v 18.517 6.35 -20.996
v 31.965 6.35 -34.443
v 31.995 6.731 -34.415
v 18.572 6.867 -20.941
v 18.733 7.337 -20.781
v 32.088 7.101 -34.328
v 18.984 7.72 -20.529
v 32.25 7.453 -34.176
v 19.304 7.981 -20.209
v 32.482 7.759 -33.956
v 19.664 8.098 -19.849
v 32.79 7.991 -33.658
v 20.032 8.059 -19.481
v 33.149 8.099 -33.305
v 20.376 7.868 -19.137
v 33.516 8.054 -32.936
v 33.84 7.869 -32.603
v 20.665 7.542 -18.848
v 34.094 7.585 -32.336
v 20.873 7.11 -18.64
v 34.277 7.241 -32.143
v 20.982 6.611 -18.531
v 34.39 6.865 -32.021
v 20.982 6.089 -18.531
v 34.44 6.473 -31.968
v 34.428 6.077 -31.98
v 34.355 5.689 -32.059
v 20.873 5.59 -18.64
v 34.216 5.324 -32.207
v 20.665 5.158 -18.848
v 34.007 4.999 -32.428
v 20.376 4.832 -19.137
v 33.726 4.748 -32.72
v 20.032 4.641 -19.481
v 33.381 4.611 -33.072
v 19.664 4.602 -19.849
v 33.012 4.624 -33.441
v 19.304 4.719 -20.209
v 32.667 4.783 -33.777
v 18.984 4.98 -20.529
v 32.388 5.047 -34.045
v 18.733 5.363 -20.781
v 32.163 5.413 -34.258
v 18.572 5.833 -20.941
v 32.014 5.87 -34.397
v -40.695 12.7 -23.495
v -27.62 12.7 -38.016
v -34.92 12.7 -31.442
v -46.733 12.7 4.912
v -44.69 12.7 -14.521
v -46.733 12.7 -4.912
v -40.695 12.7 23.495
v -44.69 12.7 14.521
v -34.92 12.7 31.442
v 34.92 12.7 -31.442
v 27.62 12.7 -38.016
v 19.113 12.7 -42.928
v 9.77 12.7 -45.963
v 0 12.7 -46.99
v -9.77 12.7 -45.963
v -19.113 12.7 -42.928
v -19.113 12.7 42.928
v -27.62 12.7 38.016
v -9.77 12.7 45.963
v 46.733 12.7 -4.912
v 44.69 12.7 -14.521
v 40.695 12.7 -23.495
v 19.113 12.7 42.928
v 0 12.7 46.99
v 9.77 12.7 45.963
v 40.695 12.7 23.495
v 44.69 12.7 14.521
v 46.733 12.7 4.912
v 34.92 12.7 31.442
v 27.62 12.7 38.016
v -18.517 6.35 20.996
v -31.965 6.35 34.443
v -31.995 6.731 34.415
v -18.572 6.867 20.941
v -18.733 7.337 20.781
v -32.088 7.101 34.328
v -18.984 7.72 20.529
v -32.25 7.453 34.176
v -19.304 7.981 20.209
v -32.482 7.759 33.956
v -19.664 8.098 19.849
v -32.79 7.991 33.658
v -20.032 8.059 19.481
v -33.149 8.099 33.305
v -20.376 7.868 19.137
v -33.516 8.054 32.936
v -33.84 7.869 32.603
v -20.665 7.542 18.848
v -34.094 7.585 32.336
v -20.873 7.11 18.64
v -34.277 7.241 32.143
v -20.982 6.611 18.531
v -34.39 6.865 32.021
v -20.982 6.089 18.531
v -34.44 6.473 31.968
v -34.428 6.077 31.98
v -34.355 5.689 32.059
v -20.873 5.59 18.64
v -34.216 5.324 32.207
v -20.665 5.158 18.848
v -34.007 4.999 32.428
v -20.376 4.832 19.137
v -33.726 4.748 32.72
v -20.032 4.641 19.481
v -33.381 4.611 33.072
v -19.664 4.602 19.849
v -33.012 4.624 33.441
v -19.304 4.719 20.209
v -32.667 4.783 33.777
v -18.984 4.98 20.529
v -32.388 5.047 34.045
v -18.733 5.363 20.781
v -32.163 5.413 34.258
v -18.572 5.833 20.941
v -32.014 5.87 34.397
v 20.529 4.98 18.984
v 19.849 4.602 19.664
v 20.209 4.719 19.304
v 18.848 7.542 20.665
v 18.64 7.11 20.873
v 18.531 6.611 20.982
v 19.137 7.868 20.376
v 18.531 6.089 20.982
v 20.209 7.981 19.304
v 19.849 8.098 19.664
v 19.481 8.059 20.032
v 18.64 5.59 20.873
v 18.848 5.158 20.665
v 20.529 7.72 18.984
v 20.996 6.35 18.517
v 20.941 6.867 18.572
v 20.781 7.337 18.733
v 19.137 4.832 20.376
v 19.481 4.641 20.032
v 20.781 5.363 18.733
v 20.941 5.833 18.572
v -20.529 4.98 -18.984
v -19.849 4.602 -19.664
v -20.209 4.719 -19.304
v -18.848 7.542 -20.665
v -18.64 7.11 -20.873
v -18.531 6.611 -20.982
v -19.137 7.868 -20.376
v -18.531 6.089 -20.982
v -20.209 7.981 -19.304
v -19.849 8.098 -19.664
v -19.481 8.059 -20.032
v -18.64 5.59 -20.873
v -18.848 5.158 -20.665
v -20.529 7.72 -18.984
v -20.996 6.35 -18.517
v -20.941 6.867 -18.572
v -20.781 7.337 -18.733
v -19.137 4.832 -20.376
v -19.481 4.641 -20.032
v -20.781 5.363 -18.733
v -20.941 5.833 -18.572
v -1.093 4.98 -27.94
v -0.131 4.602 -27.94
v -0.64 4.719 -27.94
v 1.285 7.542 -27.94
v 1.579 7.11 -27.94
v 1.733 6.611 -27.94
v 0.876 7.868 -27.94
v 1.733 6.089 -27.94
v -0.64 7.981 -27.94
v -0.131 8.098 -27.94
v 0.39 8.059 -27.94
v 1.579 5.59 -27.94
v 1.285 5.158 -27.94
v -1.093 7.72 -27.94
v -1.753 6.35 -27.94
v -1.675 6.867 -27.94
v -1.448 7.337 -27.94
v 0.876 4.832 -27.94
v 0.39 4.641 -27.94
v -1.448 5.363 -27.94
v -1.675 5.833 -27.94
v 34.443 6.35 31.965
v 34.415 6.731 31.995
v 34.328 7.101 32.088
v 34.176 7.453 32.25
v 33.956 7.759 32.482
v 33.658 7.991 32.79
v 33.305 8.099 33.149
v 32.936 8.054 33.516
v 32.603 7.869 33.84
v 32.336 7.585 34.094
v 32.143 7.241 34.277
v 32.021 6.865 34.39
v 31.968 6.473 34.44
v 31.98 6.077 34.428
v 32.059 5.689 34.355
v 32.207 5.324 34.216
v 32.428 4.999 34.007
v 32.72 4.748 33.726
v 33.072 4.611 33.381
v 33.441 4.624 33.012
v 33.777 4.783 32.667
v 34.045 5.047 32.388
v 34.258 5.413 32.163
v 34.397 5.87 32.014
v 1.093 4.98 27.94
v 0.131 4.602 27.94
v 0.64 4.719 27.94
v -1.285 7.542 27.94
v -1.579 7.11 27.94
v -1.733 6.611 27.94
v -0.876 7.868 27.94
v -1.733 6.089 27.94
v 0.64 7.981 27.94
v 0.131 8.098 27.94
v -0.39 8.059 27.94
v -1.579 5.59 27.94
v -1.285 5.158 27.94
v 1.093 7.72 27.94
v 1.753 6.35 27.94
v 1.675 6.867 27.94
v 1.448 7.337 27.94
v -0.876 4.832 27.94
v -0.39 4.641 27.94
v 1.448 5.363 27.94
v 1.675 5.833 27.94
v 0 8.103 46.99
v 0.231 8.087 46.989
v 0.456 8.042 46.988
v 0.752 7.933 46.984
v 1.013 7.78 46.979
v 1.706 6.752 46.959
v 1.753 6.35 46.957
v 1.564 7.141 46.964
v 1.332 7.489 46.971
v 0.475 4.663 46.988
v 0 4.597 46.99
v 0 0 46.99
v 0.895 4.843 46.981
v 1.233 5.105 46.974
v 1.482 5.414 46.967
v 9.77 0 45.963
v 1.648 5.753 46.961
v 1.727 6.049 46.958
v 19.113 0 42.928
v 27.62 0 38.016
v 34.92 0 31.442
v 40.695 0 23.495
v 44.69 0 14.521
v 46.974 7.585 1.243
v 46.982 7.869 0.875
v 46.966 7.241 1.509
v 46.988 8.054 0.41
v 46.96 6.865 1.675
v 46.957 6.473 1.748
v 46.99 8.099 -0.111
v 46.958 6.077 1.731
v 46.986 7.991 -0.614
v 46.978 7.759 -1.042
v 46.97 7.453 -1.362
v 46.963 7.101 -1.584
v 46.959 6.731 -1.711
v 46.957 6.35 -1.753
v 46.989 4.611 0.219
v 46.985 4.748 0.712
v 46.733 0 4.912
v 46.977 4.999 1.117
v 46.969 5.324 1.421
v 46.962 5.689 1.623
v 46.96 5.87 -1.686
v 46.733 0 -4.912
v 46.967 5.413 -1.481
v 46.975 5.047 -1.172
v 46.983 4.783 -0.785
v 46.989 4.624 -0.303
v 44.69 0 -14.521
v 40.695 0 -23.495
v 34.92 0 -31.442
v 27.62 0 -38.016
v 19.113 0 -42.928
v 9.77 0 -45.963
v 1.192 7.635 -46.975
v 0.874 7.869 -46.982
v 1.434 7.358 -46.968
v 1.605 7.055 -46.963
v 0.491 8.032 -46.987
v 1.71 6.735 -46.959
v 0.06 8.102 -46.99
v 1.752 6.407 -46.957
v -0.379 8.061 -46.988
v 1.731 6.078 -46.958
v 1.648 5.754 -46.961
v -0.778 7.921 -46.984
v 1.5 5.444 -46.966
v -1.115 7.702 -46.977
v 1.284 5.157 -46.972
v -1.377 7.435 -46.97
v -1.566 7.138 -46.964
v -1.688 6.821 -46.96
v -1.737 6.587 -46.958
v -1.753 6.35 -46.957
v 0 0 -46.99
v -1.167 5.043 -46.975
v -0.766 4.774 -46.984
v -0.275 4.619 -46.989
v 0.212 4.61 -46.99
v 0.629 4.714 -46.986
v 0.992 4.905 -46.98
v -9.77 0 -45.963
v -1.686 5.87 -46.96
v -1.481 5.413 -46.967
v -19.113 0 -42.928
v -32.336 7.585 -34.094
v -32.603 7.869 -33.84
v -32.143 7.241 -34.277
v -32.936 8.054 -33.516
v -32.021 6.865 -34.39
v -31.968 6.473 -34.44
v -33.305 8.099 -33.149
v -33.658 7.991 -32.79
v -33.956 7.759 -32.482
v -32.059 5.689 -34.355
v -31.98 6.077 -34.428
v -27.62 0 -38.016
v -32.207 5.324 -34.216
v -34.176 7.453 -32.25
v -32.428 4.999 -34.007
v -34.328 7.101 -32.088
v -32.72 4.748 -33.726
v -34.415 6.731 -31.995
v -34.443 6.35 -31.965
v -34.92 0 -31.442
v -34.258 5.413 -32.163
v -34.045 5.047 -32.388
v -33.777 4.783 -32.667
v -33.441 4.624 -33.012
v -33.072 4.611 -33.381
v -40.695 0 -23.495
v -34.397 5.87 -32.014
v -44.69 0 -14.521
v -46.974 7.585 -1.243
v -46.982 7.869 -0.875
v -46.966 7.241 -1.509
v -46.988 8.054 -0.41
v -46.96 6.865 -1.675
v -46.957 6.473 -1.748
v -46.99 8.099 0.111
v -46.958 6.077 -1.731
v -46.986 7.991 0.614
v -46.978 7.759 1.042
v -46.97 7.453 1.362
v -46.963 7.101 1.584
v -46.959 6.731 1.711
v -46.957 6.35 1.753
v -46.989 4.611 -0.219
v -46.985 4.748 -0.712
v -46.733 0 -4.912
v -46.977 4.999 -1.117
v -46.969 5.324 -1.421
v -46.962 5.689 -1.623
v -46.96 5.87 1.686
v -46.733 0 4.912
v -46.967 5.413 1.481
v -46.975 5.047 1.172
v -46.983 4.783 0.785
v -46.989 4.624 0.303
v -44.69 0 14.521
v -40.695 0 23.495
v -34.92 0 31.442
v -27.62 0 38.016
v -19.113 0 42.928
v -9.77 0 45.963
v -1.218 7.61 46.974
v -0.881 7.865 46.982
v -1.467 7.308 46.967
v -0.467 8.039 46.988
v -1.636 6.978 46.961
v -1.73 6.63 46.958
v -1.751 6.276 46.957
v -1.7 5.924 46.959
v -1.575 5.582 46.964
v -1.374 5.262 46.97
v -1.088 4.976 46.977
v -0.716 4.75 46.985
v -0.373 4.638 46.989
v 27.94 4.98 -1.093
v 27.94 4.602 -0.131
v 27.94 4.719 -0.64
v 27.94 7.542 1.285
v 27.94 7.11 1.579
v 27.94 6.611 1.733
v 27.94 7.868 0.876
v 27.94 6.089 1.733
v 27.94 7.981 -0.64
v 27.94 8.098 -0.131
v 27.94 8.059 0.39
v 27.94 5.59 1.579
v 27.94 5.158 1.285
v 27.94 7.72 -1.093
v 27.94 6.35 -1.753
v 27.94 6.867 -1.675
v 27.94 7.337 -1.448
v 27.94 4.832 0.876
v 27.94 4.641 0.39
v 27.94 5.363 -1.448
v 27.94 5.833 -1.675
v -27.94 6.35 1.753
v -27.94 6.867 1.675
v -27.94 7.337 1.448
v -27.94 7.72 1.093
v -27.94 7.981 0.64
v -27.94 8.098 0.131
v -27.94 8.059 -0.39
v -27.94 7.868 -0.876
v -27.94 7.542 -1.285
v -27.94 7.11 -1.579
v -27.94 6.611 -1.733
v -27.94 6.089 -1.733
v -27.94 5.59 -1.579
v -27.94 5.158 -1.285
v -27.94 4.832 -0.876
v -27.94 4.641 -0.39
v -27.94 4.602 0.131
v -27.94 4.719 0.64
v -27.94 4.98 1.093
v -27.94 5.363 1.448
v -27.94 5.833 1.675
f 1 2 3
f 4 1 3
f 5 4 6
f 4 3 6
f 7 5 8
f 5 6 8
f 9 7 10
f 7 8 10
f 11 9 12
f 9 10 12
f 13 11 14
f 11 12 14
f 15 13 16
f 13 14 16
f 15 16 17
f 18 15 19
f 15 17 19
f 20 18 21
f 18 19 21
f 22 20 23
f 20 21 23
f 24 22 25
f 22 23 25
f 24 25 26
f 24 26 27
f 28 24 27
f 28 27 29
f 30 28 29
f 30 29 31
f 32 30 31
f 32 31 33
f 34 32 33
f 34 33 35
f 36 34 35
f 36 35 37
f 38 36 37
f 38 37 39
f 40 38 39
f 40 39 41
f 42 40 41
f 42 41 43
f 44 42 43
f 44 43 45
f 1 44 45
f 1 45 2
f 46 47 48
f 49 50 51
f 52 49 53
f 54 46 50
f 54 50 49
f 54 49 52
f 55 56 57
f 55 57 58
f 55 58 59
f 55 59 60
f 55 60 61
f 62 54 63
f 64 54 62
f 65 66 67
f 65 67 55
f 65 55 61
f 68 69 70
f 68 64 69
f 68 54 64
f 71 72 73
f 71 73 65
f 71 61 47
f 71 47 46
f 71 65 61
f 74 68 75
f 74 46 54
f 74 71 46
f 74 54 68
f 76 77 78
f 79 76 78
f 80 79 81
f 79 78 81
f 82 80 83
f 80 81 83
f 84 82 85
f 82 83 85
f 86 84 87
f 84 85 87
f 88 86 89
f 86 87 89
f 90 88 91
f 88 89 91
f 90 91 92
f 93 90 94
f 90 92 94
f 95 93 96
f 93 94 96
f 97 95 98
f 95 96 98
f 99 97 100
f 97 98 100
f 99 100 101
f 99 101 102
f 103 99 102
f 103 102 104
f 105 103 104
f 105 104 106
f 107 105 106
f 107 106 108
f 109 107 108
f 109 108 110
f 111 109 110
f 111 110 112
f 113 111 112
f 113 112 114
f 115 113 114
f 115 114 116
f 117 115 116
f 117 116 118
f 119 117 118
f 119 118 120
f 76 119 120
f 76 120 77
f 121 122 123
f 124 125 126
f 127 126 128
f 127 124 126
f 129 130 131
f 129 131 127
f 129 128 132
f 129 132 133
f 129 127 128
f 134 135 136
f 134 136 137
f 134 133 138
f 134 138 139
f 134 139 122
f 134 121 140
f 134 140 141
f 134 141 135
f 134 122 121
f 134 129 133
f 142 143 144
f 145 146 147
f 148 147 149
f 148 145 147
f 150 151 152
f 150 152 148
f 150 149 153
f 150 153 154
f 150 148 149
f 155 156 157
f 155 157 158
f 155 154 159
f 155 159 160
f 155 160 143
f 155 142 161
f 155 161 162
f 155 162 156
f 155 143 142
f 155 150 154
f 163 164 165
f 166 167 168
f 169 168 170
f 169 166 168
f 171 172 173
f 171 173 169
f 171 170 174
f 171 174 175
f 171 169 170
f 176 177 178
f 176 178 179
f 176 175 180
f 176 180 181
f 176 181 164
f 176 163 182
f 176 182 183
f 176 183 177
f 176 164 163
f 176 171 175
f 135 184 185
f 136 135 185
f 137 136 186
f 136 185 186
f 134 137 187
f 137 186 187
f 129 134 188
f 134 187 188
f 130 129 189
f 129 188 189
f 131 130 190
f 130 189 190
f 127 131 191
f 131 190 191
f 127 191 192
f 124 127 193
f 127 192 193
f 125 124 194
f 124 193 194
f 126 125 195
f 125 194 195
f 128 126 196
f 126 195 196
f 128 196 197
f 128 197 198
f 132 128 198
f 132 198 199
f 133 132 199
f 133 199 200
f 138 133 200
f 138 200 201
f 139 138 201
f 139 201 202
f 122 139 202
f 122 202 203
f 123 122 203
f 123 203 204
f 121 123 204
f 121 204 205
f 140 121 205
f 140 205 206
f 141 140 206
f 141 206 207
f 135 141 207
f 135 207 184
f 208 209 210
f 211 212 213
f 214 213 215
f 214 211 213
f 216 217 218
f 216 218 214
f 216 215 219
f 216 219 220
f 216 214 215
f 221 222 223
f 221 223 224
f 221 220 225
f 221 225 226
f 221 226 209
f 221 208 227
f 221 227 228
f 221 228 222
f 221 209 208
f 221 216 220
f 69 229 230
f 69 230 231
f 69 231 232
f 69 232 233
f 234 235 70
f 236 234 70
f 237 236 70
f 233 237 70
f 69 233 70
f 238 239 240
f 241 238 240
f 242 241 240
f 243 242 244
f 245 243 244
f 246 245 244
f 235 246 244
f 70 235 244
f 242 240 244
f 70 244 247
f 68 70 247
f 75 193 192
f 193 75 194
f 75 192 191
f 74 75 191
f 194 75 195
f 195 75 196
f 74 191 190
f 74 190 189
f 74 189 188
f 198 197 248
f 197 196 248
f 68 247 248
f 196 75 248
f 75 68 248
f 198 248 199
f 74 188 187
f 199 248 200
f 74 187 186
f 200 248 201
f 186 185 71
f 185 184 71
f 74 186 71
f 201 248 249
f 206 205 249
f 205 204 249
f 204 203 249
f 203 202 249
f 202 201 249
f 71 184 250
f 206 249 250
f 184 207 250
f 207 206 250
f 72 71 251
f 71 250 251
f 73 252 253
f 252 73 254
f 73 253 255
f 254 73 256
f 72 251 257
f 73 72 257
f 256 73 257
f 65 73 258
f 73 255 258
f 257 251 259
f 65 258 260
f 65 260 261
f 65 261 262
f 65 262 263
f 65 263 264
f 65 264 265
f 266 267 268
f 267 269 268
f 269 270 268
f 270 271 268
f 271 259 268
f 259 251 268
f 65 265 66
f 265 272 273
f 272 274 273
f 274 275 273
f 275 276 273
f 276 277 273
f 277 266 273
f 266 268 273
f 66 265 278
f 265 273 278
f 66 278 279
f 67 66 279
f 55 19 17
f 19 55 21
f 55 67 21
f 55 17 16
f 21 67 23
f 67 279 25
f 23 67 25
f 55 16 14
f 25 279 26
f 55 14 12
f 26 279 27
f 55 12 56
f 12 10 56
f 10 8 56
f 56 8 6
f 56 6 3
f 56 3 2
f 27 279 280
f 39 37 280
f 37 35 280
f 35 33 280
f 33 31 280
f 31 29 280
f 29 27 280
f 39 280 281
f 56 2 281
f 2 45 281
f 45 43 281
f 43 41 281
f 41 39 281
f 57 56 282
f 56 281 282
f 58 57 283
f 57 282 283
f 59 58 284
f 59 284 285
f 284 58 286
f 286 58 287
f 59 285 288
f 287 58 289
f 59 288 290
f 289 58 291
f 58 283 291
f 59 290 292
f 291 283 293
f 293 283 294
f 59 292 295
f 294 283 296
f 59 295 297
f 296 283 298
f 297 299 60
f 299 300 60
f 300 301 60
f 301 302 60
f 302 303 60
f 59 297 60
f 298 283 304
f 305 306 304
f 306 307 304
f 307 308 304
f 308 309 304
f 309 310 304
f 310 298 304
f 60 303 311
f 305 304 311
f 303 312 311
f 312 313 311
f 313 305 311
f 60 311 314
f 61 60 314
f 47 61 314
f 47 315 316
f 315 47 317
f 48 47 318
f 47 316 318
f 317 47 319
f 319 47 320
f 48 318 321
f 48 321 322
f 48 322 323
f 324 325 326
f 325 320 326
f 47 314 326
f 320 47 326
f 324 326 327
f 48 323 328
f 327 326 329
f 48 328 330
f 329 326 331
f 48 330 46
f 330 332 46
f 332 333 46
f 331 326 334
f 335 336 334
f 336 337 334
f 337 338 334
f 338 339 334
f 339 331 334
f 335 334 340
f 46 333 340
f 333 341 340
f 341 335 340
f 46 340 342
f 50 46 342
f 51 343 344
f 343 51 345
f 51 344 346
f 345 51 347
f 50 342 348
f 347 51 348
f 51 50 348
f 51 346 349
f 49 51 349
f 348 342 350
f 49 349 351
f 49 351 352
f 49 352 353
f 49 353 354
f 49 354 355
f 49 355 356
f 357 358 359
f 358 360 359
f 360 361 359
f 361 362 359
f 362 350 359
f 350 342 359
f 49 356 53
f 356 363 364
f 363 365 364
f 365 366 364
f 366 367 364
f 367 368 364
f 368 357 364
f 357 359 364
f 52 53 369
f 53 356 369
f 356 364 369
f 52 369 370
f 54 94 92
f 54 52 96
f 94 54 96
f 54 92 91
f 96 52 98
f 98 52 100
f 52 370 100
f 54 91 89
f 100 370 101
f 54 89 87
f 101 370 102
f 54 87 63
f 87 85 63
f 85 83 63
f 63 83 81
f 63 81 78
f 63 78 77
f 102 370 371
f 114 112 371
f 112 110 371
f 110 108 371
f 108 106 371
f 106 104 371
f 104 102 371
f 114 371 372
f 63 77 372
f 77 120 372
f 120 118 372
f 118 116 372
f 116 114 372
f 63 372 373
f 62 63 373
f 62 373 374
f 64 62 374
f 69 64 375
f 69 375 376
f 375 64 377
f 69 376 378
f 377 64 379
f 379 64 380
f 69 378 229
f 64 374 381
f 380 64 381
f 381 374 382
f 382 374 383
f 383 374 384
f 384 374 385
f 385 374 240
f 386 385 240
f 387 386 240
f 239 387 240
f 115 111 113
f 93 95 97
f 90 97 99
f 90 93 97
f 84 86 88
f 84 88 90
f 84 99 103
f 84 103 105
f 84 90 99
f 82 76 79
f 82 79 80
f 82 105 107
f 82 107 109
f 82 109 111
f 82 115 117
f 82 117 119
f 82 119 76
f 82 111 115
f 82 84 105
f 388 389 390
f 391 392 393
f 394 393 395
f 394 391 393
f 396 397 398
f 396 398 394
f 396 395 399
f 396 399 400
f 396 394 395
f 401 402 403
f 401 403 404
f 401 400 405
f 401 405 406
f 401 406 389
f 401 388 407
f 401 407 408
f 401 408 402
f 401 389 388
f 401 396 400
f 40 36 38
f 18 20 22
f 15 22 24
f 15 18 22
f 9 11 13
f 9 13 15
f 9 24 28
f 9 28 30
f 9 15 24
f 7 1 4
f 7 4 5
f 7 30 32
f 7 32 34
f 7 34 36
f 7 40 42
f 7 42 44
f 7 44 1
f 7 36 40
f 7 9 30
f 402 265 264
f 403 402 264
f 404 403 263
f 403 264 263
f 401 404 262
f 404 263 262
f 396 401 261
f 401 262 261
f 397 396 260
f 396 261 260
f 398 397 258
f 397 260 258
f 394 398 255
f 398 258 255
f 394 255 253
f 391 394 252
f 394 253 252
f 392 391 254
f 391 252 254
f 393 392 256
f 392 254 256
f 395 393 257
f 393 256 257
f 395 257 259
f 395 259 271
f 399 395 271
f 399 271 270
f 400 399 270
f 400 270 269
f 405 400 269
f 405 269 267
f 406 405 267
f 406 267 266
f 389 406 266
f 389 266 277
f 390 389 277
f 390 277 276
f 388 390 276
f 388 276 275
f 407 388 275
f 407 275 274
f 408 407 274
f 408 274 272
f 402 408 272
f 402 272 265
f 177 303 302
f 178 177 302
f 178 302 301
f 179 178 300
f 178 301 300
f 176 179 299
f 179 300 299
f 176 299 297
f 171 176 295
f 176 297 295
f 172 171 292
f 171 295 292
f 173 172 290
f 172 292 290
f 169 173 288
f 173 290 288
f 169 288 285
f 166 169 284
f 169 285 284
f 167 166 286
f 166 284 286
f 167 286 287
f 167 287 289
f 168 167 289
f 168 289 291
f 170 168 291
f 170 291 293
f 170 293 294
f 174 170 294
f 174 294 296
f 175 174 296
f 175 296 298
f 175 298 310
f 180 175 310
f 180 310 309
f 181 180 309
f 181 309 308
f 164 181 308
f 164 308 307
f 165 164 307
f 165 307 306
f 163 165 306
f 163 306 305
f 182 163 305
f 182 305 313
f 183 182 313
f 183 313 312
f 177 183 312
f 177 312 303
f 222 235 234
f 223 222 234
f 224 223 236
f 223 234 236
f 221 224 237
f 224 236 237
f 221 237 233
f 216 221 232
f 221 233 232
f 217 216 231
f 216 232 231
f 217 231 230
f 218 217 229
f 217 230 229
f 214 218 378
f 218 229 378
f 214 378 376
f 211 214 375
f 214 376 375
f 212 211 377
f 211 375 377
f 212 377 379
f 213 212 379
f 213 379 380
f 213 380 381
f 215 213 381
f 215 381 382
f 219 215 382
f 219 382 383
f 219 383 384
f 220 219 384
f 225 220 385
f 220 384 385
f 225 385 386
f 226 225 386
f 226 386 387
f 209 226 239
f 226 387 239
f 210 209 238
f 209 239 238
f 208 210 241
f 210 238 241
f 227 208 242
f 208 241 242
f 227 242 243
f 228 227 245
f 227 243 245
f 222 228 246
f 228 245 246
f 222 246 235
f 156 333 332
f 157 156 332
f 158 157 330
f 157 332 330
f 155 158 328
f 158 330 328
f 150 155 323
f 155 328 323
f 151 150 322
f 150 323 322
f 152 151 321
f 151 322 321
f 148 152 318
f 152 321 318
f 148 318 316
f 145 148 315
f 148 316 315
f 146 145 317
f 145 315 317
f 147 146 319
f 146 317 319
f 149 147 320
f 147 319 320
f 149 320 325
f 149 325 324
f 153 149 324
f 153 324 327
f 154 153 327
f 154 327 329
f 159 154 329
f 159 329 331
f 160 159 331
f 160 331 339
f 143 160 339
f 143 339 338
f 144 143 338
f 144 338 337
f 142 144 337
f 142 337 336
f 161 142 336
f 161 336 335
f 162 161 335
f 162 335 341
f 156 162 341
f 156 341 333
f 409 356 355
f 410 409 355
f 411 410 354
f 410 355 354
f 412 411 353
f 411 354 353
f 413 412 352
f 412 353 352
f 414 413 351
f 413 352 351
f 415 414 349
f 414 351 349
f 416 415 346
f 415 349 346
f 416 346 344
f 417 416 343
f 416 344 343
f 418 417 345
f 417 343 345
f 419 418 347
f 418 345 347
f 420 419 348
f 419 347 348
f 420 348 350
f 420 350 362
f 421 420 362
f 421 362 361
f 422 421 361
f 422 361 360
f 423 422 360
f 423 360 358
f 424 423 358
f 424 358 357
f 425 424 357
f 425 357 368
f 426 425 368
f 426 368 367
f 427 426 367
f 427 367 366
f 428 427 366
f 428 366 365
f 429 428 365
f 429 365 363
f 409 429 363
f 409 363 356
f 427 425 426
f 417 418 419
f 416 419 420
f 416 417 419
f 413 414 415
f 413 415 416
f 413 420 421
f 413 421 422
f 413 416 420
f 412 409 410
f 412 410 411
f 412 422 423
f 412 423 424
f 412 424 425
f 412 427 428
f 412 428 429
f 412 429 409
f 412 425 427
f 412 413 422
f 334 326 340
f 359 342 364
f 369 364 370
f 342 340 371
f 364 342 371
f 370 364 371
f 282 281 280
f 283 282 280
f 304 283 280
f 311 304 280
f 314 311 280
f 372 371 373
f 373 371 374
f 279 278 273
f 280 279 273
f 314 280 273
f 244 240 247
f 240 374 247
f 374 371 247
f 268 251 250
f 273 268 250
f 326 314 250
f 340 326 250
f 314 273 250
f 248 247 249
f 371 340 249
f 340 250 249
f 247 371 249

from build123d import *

# Parameters (mm, degrees)
SKETCH1_R           = 46.99
BOSS_EXTRUDE1_DEPTH = 12.7
SKETCH2_R           = 1.7526
CUT_EXTRUDE1_DEPTH  = 19.05
CIRPATTERN1_COUNT   = 8


with BuildPart() as part:
    # Sketch1 → Boss-Extrude1 (new body)
    with BuildSketch(Plane(origin=(0, 0, 0), x_dir=(1, 0, 0), z_dir=(0, 1, 0))):
        with Locations(Location((0, 0, 0), (0, 0, 270))):
            Circle(SKETCH1_R)
    extrude(amount=BOSS_EXTRUDE1_DEPTH)

    # Sketch2 → Cut-Extrude1 (cut)
    with BuildSketch(Plane.XY.offset(46.99)):
        with Locations((0, 6.35)):
            Circle(SKETCH2_R)
    cut_extrude1 = extrude(amount=-CUT_EXTRUDE1_DEPTH, mode=Mode.SUBTRACT)

    # CirPattern1: Cut-Extrude1 ×8 about axis
    cirpattern1_axis = Axis((0, 0, 0), (0, 1, 0))
    for i in range(1, CIRPATTERN1_COUNT):
        add(cut_extrude1.rotate(cirpattern1_axis, i * 360 / CIRPATTERN1_COUNT), mode=Mode.SUBTRACT)


solid = part.part
